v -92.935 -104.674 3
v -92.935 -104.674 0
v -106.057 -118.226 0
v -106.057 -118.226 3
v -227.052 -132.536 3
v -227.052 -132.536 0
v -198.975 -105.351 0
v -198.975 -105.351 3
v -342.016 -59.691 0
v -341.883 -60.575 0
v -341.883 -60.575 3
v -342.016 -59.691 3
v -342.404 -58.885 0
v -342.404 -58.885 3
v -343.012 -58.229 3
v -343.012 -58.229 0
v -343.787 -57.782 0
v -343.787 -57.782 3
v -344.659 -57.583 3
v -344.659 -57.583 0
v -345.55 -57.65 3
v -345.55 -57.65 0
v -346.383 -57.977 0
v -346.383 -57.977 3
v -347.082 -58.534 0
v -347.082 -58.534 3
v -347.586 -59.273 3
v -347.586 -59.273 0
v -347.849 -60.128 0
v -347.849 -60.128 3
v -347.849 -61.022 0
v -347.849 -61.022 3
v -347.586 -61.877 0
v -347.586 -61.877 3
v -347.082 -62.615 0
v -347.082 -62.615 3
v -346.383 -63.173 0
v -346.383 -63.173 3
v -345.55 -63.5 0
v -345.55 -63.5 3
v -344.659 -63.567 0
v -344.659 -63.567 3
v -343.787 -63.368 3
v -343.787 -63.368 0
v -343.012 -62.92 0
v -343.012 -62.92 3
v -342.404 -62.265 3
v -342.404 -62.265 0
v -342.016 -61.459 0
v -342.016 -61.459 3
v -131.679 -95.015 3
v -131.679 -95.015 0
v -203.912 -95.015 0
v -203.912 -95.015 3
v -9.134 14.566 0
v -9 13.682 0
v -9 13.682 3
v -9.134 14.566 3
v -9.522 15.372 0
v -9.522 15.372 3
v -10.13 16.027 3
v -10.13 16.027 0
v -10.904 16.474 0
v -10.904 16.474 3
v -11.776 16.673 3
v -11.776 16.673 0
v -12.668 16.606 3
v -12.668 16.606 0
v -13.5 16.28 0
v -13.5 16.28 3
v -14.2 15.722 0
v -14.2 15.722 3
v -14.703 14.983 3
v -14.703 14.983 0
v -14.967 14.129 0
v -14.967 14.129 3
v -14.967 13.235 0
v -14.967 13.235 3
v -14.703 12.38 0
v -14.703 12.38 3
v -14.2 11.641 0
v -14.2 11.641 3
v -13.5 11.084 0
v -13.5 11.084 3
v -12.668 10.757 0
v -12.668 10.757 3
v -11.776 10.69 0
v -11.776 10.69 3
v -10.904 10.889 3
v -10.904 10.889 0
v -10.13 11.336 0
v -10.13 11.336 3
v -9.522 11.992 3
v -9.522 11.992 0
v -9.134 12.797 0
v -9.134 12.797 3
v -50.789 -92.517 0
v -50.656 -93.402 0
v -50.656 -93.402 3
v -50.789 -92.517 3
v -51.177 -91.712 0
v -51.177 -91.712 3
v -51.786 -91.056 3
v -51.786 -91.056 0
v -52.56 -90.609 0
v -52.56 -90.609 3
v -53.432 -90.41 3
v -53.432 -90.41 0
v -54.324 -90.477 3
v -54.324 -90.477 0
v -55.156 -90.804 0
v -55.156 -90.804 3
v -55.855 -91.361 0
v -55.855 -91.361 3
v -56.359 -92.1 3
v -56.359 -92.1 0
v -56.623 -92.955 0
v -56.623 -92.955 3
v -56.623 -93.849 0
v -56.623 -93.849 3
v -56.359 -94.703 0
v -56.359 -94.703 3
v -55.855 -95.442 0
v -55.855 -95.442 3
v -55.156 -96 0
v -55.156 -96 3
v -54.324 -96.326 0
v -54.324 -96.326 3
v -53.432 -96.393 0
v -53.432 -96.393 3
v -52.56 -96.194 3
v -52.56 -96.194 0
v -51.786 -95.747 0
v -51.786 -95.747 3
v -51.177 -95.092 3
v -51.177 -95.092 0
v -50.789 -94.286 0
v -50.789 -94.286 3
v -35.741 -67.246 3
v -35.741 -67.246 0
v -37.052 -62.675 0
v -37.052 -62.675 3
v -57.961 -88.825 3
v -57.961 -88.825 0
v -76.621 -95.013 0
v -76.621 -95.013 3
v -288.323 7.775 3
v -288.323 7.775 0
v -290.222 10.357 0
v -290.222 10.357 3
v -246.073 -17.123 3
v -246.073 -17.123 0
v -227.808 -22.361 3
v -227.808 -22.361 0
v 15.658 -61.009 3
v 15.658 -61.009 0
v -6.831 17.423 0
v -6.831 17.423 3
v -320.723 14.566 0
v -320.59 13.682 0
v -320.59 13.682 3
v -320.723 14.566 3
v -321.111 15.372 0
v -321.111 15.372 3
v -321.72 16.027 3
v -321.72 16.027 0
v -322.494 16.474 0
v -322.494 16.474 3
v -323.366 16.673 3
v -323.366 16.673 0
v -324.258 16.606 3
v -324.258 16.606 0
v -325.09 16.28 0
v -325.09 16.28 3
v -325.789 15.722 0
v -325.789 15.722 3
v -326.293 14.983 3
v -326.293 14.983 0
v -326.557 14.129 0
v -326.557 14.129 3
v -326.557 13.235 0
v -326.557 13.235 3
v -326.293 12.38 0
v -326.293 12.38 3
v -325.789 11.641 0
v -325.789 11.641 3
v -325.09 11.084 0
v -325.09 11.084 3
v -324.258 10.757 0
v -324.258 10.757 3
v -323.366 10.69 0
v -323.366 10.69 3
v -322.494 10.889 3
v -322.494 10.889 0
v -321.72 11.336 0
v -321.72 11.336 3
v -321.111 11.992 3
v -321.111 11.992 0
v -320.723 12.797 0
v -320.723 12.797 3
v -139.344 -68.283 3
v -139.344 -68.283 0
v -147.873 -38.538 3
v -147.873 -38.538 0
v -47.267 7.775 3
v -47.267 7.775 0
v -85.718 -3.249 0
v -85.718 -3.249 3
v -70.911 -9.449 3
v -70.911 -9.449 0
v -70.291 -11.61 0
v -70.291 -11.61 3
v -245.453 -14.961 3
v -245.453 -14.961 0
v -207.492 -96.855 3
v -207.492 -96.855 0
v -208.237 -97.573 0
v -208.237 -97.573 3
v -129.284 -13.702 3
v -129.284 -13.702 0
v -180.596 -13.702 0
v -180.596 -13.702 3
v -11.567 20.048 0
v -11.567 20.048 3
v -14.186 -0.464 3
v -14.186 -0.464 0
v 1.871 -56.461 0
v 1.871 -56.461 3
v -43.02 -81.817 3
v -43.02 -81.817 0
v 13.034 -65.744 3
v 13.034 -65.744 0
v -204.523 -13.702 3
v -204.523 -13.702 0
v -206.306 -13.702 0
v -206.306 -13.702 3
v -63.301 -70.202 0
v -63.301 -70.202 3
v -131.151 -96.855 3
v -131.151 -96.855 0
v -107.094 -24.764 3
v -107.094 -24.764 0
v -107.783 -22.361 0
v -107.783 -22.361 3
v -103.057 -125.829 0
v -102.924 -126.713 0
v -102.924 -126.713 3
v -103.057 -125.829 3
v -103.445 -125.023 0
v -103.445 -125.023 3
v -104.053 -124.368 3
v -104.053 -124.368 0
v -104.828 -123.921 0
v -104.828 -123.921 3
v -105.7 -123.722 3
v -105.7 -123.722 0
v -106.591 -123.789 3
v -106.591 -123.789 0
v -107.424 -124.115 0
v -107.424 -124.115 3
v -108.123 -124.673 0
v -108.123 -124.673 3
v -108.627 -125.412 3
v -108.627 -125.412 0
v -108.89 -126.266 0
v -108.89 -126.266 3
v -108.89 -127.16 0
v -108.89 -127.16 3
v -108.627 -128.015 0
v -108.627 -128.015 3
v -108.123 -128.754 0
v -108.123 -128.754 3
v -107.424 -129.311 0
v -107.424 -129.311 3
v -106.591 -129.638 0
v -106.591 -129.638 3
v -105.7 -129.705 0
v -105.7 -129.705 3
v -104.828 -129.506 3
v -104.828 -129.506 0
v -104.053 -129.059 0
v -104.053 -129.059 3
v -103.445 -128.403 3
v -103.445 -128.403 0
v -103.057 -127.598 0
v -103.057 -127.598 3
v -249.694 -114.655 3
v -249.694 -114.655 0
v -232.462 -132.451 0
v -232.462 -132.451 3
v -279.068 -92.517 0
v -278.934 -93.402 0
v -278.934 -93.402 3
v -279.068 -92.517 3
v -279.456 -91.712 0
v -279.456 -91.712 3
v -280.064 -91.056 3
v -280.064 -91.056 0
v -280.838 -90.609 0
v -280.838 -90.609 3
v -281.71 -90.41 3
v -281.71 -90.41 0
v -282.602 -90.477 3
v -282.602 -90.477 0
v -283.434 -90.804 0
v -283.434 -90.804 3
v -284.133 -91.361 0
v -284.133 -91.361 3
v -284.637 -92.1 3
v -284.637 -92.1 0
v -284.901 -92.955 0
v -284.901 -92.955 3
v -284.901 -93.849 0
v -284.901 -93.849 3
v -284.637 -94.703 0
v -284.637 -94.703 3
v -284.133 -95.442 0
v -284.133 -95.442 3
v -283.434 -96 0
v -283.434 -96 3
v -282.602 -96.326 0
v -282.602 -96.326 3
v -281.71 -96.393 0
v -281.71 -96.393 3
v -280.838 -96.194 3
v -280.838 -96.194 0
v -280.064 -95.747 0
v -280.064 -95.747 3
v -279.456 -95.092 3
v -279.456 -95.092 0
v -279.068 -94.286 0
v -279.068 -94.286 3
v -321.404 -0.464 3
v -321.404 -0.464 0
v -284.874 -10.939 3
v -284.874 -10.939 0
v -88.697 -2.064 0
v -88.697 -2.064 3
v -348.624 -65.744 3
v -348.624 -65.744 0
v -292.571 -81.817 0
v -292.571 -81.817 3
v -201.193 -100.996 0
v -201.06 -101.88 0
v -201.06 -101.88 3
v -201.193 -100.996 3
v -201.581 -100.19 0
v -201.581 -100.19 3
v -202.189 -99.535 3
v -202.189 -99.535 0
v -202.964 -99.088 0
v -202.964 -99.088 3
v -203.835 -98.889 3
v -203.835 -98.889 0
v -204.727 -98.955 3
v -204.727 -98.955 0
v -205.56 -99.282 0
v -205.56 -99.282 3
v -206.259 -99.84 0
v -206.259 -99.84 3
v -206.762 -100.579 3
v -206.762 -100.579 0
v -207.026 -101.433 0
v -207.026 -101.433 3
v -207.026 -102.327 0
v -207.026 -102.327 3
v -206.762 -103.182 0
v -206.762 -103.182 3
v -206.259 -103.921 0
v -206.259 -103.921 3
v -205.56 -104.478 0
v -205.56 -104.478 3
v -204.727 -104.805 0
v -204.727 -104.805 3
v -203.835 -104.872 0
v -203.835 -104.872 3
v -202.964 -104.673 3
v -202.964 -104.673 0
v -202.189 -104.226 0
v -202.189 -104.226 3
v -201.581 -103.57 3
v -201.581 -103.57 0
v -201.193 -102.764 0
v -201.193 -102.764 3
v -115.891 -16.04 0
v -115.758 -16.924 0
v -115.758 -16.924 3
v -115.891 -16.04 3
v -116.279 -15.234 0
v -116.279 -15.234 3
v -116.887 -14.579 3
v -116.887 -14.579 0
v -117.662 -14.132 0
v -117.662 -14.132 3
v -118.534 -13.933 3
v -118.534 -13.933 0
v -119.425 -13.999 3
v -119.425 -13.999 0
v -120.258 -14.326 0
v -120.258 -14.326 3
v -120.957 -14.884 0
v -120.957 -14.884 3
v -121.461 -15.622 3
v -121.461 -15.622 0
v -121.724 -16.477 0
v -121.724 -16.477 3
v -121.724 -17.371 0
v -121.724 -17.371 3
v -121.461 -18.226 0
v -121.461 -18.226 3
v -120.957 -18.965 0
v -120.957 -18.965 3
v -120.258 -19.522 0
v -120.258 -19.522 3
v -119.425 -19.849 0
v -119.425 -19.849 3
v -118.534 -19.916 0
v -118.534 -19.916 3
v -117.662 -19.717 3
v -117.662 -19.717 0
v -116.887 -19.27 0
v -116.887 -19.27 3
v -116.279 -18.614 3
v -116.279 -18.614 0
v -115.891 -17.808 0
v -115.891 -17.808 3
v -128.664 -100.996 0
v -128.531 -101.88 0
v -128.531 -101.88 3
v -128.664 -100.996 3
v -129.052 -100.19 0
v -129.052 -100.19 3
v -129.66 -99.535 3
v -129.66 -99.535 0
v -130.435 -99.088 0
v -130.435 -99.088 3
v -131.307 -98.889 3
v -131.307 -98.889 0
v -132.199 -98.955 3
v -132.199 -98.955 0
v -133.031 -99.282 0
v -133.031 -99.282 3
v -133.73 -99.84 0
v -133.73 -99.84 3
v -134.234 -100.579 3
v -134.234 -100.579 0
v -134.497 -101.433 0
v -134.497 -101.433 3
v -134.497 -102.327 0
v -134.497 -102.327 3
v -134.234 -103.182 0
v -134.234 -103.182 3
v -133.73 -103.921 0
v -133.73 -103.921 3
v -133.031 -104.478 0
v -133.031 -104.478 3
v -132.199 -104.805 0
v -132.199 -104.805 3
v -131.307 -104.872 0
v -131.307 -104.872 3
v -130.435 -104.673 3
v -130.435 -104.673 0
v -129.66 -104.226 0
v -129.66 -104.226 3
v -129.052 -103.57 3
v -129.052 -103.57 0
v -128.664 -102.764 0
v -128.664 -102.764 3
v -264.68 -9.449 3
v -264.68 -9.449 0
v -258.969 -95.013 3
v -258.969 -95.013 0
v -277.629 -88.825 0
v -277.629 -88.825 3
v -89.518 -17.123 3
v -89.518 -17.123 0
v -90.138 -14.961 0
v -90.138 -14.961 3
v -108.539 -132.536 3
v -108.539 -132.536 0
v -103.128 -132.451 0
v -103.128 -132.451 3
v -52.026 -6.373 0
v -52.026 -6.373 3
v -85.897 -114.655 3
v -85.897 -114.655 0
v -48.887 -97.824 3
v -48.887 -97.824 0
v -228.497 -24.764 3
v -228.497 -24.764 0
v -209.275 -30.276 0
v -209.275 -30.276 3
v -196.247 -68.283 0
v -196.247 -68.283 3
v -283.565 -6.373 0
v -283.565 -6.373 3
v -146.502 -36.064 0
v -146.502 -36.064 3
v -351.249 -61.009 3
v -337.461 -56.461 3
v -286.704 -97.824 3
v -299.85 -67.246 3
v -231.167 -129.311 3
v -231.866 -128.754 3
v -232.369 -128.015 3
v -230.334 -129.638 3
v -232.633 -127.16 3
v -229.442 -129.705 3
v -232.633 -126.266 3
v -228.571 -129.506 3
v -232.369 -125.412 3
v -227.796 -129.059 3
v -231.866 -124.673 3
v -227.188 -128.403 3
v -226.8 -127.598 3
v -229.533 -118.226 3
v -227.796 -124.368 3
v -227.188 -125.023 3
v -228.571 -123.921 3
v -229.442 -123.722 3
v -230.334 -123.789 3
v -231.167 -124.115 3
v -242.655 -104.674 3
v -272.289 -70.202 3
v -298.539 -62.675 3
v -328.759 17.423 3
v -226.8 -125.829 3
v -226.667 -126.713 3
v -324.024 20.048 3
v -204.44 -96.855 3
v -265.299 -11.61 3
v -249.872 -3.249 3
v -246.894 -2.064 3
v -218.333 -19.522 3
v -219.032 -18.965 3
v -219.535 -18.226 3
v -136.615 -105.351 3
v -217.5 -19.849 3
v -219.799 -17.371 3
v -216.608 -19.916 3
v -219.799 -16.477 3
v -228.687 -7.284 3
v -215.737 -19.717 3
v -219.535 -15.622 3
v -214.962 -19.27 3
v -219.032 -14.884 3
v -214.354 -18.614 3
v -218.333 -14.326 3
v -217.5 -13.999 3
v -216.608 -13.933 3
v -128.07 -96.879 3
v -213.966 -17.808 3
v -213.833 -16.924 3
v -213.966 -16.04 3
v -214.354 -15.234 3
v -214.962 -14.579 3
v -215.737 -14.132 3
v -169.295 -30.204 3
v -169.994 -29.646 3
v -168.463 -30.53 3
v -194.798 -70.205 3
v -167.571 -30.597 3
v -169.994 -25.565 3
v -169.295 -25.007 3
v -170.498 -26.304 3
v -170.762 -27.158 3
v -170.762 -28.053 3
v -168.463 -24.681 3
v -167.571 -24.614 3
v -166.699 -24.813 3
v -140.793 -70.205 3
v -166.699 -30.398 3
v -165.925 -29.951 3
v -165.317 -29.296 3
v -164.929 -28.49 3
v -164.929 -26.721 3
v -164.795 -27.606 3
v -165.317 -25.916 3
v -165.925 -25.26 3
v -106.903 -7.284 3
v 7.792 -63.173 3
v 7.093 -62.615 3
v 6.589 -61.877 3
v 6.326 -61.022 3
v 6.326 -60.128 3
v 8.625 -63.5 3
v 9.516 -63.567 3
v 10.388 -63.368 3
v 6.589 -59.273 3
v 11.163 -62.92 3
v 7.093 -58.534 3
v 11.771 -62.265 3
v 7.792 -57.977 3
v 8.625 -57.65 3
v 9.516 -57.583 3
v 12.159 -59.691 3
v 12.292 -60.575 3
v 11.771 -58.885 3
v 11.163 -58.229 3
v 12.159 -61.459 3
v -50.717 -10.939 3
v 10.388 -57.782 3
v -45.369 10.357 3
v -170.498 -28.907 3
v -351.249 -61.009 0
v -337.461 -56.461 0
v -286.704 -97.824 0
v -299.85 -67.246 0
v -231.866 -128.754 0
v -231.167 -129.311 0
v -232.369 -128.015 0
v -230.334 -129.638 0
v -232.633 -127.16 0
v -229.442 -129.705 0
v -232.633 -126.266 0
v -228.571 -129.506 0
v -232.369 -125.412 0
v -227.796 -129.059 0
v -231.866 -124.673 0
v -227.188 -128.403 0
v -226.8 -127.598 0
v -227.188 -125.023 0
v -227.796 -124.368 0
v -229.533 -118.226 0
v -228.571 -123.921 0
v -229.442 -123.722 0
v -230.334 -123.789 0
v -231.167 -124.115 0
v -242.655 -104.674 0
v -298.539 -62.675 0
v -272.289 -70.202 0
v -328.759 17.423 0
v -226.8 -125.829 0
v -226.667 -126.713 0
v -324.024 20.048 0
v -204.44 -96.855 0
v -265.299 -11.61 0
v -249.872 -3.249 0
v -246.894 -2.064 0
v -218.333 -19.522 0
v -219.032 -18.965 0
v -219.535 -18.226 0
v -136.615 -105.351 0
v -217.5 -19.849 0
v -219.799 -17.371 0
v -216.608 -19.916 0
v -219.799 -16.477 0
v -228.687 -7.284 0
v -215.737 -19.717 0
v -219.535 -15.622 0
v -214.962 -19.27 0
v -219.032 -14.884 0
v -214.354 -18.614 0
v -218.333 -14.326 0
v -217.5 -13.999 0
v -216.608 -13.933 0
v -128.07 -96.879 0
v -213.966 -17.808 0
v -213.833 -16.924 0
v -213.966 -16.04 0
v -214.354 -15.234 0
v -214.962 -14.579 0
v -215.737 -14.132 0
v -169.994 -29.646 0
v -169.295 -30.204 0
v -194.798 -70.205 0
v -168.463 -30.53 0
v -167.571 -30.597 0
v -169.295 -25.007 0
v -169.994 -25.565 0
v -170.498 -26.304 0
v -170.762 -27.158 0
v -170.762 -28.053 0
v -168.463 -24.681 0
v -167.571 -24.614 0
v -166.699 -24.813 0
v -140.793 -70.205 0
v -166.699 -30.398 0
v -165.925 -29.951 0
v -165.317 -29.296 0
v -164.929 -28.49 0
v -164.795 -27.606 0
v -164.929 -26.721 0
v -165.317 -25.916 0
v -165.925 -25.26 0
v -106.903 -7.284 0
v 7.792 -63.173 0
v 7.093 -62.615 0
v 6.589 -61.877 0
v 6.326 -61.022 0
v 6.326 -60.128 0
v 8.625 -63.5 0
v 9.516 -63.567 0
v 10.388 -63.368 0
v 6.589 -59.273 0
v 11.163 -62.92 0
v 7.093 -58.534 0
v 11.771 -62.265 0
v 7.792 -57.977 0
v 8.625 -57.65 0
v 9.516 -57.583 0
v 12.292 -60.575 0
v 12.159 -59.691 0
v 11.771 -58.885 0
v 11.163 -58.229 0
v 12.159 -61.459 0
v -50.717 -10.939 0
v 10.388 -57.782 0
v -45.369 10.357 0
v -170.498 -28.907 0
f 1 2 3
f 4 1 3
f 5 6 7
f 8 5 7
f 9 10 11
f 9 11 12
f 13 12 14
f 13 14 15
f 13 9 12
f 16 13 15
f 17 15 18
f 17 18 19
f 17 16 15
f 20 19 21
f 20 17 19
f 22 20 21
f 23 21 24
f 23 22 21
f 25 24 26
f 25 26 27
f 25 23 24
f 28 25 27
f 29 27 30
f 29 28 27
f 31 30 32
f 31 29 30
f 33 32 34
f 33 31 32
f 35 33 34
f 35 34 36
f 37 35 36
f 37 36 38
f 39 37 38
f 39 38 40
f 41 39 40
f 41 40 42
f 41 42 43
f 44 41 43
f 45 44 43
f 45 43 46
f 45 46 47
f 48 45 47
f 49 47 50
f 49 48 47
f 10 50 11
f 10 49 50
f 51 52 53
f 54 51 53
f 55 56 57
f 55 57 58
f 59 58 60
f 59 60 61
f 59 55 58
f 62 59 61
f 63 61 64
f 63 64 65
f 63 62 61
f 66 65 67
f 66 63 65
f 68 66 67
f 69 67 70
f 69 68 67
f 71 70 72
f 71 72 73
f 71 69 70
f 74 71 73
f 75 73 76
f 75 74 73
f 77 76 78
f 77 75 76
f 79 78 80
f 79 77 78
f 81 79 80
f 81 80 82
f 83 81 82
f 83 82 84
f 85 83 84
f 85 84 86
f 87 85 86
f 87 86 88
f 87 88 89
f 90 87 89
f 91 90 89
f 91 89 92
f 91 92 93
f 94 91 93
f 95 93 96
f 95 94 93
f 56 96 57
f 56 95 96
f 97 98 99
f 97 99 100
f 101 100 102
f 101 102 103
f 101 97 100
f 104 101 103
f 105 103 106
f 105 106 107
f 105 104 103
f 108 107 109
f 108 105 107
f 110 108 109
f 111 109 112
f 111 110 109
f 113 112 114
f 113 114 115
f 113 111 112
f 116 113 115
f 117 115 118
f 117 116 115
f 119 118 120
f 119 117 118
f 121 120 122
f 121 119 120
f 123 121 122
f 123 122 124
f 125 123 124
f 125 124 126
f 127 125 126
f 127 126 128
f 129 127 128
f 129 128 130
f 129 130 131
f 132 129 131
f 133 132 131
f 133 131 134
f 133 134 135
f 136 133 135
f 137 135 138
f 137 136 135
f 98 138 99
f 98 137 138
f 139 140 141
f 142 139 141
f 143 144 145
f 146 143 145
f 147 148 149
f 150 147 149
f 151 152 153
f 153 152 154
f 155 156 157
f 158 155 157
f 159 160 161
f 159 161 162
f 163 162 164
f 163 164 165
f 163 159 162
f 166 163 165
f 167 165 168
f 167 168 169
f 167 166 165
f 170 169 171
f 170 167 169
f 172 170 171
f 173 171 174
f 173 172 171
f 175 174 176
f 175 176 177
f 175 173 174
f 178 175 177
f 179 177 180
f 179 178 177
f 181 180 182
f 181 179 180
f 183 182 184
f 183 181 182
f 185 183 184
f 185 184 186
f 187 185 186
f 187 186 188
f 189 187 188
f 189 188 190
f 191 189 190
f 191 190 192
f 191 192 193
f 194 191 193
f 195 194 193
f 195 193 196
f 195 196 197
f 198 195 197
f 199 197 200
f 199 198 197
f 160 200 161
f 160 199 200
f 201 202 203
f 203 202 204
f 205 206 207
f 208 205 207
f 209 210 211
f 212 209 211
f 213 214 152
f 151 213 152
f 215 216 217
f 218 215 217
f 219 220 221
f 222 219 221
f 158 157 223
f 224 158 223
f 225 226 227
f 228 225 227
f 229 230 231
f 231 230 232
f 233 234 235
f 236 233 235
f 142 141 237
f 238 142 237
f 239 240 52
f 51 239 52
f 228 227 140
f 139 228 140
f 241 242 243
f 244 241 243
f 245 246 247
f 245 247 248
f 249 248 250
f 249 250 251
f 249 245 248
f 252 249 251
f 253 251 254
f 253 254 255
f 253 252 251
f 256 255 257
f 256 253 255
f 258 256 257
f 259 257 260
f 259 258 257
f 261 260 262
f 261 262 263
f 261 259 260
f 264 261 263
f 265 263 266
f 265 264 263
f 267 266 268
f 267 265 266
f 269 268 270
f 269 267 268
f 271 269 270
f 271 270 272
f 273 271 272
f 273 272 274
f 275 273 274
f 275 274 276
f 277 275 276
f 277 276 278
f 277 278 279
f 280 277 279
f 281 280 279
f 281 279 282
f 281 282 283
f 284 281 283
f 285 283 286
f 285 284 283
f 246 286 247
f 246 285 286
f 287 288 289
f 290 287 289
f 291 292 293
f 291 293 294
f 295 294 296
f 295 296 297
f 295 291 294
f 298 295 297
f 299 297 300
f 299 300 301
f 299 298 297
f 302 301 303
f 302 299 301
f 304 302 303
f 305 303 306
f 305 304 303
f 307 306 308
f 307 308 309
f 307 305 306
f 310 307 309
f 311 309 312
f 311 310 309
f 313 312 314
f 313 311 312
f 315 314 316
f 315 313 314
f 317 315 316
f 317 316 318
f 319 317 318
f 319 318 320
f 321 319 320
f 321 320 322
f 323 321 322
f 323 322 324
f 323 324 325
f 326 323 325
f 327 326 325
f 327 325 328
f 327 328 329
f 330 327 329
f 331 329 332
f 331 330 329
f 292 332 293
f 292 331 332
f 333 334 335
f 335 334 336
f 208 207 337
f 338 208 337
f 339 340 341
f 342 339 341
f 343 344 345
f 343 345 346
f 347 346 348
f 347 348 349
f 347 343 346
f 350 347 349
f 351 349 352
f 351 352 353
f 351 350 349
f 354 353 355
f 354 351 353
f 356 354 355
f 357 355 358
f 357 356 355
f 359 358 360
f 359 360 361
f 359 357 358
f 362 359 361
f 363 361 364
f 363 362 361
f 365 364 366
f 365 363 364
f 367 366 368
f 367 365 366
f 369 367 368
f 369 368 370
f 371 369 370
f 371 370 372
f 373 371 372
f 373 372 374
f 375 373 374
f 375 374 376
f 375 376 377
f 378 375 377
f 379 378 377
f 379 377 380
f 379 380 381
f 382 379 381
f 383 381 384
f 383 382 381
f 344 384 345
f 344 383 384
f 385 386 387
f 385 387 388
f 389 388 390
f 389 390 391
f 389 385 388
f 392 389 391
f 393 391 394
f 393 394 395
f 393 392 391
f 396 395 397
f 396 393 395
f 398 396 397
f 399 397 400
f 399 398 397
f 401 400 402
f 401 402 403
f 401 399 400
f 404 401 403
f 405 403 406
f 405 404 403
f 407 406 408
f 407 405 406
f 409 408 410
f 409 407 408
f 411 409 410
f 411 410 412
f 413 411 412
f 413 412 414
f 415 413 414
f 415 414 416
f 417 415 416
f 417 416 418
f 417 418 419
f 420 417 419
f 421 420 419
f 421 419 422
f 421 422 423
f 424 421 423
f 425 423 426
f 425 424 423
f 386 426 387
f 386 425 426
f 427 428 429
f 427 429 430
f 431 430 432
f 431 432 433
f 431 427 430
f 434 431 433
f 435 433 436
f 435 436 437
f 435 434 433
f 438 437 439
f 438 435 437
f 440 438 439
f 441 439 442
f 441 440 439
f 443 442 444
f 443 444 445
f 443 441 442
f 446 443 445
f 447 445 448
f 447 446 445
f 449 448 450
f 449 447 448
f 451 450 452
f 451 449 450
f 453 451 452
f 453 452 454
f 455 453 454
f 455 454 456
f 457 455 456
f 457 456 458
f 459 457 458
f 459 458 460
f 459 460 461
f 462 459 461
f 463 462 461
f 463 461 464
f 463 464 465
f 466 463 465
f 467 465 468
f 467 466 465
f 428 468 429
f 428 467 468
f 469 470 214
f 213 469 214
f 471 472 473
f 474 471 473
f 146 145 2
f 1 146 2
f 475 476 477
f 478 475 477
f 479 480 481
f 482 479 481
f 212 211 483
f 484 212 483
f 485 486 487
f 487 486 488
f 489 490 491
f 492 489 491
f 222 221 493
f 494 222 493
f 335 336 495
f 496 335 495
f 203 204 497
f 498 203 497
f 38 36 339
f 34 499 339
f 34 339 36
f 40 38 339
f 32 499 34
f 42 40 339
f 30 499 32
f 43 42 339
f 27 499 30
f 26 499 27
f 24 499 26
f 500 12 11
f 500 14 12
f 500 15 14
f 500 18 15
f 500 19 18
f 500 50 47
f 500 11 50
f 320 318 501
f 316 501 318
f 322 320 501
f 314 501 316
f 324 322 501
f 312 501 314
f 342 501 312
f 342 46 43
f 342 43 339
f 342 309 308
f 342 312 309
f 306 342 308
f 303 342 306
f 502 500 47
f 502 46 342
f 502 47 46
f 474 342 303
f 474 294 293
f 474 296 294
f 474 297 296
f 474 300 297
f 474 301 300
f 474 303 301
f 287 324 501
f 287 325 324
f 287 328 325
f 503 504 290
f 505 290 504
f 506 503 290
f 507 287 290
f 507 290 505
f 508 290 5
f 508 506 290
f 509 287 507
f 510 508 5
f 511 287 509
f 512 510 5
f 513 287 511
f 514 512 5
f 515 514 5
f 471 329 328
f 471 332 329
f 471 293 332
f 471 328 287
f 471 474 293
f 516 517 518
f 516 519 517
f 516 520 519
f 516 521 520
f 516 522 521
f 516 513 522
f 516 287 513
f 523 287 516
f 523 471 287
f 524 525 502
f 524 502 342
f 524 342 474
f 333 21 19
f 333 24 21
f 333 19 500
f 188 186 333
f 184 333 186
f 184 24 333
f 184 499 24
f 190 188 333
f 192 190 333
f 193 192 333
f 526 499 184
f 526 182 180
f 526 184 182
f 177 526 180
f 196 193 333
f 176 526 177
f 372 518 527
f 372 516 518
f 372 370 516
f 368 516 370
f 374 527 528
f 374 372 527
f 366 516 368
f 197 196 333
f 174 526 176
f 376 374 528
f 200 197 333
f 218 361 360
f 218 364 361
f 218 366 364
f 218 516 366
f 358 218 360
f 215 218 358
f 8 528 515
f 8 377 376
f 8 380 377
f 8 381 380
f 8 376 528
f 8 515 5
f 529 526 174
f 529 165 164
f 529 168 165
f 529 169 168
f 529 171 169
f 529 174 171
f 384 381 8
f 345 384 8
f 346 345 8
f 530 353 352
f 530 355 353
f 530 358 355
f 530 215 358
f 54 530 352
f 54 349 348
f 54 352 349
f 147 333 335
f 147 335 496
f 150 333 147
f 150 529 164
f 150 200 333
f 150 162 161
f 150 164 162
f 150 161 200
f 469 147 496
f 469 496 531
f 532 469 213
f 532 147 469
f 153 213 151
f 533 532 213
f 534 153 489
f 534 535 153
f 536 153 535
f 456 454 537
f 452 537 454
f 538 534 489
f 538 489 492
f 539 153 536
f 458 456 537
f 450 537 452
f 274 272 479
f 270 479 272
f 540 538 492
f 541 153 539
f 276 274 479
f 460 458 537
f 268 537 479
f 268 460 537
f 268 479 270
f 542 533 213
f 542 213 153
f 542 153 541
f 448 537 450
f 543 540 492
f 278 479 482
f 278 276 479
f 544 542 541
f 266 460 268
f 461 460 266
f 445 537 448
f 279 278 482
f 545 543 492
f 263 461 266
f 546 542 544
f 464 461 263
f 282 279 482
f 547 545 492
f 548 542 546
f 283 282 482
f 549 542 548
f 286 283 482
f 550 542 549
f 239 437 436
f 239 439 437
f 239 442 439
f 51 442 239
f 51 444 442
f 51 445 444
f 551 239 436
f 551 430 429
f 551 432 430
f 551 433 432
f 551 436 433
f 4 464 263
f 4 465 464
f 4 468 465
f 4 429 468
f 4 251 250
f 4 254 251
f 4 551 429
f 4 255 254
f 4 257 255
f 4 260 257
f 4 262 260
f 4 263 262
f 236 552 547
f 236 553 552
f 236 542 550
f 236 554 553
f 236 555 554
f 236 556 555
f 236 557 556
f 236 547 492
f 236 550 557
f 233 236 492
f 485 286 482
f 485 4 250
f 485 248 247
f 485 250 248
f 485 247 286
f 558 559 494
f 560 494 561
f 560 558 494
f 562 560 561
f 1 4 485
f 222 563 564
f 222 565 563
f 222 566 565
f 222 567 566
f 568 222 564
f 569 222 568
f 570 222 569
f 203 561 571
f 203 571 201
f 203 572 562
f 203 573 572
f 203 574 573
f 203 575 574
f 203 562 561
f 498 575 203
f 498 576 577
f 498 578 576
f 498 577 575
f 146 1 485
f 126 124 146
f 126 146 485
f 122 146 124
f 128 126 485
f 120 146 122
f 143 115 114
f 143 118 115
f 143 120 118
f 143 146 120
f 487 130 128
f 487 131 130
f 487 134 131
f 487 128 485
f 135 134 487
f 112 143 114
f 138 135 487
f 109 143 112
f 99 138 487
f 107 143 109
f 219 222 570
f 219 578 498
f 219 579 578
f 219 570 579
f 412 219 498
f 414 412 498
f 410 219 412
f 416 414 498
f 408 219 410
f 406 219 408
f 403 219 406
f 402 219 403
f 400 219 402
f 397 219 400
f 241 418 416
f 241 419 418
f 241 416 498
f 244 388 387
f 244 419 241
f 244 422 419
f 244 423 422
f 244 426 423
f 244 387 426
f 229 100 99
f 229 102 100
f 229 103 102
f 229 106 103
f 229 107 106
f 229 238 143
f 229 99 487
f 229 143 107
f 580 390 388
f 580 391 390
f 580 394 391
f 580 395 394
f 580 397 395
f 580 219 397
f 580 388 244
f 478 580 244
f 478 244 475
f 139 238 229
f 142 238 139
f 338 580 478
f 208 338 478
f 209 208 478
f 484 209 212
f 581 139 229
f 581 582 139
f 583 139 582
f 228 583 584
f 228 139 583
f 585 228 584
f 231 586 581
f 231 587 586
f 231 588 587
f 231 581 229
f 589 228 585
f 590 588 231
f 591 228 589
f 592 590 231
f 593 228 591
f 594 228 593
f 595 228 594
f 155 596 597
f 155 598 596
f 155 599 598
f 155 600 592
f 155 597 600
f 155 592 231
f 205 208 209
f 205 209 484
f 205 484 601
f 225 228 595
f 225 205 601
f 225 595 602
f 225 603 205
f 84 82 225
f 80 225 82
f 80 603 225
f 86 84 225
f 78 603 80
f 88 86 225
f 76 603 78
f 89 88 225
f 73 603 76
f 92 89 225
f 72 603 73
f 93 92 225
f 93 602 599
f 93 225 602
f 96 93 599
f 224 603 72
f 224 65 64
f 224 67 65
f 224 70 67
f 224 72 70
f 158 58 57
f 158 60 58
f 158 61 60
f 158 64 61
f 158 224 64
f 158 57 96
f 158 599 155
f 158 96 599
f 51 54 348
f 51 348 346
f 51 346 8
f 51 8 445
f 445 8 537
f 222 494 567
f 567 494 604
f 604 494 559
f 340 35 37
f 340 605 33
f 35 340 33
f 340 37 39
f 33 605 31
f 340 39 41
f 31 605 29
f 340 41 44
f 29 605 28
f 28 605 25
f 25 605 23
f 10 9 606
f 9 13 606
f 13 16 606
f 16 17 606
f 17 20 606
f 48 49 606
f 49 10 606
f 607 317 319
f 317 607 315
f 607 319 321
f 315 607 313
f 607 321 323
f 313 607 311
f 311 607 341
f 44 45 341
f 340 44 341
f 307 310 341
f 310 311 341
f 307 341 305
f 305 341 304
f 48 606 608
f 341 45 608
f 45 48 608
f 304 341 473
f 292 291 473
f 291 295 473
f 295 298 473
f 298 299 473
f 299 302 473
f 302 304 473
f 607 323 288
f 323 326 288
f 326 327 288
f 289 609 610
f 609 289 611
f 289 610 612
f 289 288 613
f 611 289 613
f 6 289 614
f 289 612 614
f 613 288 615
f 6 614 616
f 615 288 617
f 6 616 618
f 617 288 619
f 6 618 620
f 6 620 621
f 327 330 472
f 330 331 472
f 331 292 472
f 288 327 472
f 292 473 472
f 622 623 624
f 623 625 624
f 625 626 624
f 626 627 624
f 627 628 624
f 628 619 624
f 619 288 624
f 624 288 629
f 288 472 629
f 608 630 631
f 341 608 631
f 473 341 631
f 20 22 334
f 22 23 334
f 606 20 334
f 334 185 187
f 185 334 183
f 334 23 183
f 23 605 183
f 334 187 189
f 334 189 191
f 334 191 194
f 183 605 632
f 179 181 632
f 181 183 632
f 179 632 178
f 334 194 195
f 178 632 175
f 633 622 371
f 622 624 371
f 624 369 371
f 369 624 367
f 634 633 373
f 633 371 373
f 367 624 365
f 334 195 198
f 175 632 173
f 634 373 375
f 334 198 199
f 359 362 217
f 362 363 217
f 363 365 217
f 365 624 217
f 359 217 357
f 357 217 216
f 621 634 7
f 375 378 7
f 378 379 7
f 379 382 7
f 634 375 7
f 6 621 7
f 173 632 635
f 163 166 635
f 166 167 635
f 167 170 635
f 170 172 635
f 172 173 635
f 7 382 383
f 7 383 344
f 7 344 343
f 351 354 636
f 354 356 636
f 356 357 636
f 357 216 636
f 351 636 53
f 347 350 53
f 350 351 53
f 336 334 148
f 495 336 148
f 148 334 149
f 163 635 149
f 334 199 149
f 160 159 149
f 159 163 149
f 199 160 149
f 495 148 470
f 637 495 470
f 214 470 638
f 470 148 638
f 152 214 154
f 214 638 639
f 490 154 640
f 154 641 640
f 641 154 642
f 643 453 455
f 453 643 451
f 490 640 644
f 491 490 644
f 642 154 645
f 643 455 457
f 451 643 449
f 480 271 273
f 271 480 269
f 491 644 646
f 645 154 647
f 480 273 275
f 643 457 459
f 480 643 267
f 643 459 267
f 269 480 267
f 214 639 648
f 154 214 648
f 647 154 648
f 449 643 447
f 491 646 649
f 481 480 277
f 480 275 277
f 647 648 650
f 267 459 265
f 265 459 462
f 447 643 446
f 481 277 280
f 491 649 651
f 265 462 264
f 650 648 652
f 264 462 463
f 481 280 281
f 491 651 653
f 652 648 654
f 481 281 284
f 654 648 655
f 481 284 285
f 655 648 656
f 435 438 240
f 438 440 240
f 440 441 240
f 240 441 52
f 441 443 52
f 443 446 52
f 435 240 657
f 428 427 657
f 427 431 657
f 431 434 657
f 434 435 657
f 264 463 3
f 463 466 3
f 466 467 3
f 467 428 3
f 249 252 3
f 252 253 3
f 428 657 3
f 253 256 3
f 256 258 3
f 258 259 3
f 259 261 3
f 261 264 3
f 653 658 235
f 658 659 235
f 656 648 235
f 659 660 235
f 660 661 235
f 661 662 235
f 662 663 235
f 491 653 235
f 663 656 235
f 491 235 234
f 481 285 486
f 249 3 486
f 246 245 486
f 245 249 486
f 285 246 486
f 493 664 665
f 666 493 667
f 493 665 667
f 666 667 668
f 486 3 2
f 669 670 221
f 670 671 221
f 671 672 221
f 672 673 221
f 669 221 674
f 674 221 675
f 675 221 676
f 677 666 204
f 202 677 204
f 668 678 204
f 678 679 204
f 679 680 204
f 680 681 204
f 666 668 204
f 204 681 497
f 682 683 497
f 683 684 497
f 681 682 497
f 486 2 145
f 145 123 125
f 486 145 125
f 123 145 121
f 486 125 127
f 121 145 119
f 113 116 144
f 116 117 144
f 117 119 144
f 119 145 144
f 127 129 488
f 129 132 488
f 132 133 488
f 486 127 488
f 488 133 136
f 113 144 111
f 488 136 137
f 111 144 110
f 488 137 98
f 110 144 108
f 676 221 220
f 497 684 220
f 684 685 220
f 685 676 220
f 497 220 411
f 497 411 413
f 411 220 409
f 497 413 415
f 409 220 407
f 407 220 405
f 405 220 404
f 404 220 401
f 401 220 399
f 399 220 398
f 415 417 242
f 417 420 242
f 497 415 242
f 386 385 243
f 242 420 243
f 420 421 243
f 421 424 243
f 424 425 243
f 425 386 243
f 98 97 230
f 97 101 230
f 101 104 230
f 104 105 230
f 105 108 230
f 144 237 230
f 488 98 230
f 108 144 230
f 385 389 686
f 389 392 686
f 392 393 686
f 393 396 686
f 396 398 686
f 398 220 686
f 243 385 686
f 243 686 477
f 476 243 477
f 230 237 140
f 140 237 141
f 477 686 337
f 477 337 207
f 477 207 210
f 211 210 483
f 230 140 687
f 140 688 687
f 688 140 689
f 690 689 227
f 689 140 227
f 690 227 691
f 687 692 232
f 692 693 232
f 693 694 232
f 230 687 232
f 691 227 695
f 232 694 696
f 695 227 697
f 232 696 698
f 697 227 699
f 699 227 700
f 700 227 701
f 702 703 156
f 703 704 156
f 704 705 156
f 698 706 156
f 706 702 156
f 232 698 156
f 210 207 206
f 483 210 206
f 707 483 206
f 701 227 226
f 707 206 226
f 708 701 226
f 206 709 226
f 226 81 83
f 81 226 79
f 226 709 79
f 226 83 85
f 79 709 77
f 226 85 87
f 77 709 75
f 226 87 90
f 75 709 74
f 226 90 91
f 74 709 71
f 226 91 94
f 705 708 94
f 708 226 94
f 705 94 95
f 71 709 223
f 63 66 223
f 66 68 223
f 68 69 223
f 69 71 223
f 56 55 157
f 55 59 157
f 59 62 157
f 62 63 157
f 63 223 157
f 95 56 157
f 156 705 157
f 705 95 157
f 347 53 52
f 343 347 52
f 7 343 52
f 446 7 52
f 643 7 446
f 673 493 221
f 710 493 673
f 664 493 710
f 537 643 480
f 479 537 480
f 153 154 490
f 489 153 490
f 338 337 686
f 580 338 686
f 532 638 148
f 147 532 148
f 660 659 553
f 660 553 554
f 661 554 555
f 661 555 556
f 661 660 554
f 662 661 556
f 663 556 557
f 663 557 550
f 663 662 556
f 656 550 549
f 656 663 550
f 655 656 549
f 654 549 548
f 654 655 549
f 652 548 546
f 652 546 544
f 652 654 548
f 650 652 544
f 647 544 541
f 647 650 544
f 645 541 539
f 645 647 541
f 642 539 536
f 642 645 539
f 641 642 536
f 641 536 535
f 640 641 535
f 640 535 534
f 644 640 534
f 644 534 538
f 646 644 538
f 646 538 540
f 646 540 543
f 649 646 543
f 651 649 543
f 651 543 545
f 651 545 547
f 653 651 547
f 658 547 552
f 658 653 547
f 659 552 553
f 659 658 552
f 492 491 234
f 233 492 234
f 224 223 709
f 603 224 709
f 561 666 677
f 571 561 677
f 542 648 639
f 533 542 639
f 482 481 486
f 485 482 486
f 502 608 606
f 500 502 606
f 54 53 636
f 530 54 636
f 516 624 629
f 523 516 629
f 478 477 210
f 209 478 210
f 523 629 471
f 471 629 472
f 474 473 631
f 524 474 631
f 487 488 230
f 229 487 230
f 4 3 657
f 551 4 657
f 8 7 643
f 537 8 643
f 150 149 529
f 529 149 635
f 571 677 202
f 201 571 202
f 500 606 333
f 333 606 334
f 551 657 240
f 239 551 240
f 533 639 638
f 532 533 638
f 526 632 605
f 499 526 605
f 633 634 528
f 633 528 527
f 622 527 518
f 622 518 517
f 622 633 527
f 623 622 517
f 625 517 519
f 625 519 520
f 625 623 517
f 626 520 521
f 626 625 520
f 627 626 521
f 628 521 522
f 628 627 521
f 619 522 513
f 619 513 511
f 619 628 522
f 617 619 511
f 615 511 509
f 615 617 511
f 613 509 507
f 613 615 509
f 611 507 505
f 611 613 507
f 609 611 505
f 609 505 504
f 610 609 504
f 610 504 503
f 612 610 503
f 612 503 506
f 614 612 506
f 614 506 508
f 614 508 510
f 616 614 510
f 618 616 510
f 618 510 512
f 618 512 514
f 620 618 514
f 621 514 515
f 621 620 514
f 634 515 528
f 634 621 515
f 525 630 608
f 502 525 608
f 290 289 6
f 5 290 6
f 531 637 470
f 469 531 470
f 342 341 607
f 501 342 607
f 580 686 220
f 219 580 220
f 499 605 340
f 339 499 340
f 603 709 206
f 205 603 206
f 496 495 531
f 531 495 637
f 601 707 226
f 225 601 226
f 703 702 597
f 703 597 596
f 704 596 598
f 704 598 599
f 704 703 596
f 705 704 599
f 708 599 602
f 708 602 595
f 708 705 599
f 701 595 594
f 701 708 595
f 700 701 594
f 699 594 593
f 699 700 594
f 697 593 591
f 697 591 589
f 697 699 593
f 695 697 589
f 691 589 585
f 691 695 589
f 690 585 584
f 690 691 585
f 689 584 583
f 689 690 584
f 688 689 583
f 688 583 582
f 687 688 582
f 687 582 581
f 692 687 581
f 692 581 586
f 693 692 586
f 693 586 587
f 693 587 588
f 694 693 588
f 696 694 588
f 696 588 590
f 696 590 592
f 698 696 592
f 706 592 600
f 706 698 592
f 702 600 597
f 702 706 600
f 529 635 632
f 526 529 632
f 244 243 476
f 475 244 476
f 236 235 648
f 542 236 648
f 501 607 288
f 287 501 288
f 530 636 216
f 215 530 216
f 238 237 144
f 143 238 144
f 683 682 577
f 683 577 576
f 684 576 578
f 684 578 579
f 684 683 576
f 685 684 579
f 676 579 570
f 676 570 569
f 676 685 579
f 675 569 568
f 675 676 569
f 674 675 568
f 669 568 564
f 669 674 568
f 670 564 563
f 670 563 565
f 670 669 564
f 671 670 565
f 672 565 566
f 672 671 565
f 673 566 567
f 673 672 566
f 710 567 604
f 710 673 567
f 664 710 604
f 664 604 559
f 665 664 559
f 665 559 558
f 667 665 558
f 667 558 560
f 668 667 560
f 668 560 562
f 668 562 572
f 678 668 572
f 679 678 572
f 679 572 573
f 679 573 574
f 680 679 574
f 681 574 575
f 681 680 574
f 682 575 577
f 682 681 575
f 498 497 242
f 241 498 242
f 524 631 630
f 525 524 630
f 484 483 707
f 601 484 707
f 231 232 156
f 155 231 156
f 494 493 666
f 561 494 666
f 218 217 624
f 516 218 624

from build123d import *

# Parameters (mm, degrees)
ESQUISSE1_R        = 3
BOSS_EXTRU_1_DEPTH = 3


with BuildPart() as part:
    # Esquisse1 → Boss.-Extru.1 (new body)
    with BuildSketch(Plane.XY):
        Polygon((-106.057456456, -118.225792128), (-128.0696158, -96.878899722), (-131.150893181, -96.85509979), (-131.678504691, -95.01509979), (-203.912015052, -95.01509979), (-204.439626562, -96.85509979), (-207.491865187, -96.85509979), (-208.236606037, -97.572971364), (-229.533063287, -118.225792128), (-242.655085998, -104.673746846), (-258.969310369, -95.012679745), (-277.629290011, -88.825419148), (-272.289144354, -70.202118055), (-298.538981418, -62.6750984), (-299.849714513, -67.246167925), (-337.461409717, -56.461187875), (-321.404434006, -0.463858857), (-284.873898651, -10.938821309), (-283.564528344, -6.372504389), (-265.299260667, -11.609985616), (-264.679553884, -9.448811229), (-245.452786066, -14.960840928), (-246.072799476, -17.123084647), (-227.807531798, -22.360565873), (-228.496674065, -24.763890567), (-209.275142378, -30.275576085), (-204.522611526, -13.701531345), (-206.306232172, -13.701531345), (-228.687205955, -7.283890384), (-246.894010665, -2.064269008), (-249.872259625, -3.248768002), (-288.323340616, 7.774587685), (-290.221637422, 10.357120157), (-324.023652204, 20.047657387), (-328.759186056, 17.422535954), (-351.248940808, -61.008559605), (-348.624077987, -65.743937486), (-292.570685007, -81.816989279), (-286.703799003, -97.823971184), (-249.693611115, -114.655437515), (-232.462472657, -132.451258614), (-227.051679806, -132.536382762), (-198.975350278, -105.350948678), (-136.615169465, -105.350948678), (-108.538839937, -132.536382762), (-103.128047086, -132.451258614), (-85.896908628, -114.655437515), (-48.88672074, -97.823971184), (-43.019834736, -81.816989279), (13.033558244, -65.743937486), (15.658421065, -61.008559605), (-6.831333687, 17.422535954), (-11.566867539, 20.047657387), (-45.368882322, 10.357120157), (-47.267179127, 7.774587685), (-85.718260118, -3.248768002), (-88.696509078, -2.064269008), (-106.903313789, -7.283890384), (-129.284287571, -13.701531345), (-180.595724501, -13.701531345), (-196.24658732, -68.282576398), (-194.797862031, -70.20509979), (-140.792657712, -70.20509979), (-139.343932423, -68.282576398), (-147.87312166, -38.537758661), (-146.501872979, -36.063960558), (-107.093845678, -24.763890567), (-107.782987945, -22.360565873), (-89.517720268, -17.123084647), (-90.137733677, -14.960840928), (-70.910965859, -9.448811229), (-70.291259076, -11.609985616), (-52.025991399, -6.372504389), (-50.716621092, -10.938821309), (-14.186085737, -0.463858857), (1.870889973, -56.461187875), (-35.740805231, -67.246167925), (-37.051538325, -62.6750984), (-63.301375389, -70.202118055), (-57.961229733, -88.825419148), (-76.621209374, -95.012679745), (-92.935433745, -104.673746846), align=None)
        with Locations((-281.934339477, -93.401689518)):
            Circle(ESQUISSE1_R, mode=Mode.SUBTRACT)
        with Locations((-229.666591606, -126.713325795)):
            Circle(ESQUISSE1_R, mode=Mode.SUBTRACT)
        with Locations((-204.059552706, -101.880200807)):
            Circle(ESQUISSE1_R, mode=Mode.SUBTRACT)
        with Locations((-344.882804027, -60.574933915)):
            Circle(ESQUISSE1_R, mode=Mode.SUBTRACT)
        with Locations((-105.923928137, -126.713325795)):
            Circle(ESQUISSE1_R, mode=Mode.SUBTRACT)
        with Locations((-131.530967037, -101.880200807)):
            Circle(ESQUISSE1_R, mode=Mode.SUBTRACT)
        with Locations((-53.656180266, -93.401689518)):
            Circle(ESQUISSE1_R, mode=Mode.SUBTRACT)
        with Locations((9.292284284, -60.574933915)):
            Circle(ESQUISSE1_R, mode=Mode.SUBTRACT)
        with Locations((-323.590068827, 13.68165837)):
            Circle(ESQUISSE1_R, mode=Mode.SUBTRACT)
        with Locations((-216.832585966, -16.924131519)):
            Circle(ESQUISSE1_R, mode=Mode.SUBTRACT)
        with Locations((-118.757933777, -16.924131519)):
            Circle(ESQUISSE1_R, mode=Mode.SUBTRACT)
        with Locations((-12.000450916, 13.68165837)):
            Circle(ESQUISSE1_R, mode=Mode.SUBTRACT)
        with Locations((-167.795259872, -27.605548894)):
            Circle(ESQUISSE1_R, mode=Mode.SUBTRACT)
    extrude(amount=BOSS_EXTRU_1_DEPTH)


solid = part.part
